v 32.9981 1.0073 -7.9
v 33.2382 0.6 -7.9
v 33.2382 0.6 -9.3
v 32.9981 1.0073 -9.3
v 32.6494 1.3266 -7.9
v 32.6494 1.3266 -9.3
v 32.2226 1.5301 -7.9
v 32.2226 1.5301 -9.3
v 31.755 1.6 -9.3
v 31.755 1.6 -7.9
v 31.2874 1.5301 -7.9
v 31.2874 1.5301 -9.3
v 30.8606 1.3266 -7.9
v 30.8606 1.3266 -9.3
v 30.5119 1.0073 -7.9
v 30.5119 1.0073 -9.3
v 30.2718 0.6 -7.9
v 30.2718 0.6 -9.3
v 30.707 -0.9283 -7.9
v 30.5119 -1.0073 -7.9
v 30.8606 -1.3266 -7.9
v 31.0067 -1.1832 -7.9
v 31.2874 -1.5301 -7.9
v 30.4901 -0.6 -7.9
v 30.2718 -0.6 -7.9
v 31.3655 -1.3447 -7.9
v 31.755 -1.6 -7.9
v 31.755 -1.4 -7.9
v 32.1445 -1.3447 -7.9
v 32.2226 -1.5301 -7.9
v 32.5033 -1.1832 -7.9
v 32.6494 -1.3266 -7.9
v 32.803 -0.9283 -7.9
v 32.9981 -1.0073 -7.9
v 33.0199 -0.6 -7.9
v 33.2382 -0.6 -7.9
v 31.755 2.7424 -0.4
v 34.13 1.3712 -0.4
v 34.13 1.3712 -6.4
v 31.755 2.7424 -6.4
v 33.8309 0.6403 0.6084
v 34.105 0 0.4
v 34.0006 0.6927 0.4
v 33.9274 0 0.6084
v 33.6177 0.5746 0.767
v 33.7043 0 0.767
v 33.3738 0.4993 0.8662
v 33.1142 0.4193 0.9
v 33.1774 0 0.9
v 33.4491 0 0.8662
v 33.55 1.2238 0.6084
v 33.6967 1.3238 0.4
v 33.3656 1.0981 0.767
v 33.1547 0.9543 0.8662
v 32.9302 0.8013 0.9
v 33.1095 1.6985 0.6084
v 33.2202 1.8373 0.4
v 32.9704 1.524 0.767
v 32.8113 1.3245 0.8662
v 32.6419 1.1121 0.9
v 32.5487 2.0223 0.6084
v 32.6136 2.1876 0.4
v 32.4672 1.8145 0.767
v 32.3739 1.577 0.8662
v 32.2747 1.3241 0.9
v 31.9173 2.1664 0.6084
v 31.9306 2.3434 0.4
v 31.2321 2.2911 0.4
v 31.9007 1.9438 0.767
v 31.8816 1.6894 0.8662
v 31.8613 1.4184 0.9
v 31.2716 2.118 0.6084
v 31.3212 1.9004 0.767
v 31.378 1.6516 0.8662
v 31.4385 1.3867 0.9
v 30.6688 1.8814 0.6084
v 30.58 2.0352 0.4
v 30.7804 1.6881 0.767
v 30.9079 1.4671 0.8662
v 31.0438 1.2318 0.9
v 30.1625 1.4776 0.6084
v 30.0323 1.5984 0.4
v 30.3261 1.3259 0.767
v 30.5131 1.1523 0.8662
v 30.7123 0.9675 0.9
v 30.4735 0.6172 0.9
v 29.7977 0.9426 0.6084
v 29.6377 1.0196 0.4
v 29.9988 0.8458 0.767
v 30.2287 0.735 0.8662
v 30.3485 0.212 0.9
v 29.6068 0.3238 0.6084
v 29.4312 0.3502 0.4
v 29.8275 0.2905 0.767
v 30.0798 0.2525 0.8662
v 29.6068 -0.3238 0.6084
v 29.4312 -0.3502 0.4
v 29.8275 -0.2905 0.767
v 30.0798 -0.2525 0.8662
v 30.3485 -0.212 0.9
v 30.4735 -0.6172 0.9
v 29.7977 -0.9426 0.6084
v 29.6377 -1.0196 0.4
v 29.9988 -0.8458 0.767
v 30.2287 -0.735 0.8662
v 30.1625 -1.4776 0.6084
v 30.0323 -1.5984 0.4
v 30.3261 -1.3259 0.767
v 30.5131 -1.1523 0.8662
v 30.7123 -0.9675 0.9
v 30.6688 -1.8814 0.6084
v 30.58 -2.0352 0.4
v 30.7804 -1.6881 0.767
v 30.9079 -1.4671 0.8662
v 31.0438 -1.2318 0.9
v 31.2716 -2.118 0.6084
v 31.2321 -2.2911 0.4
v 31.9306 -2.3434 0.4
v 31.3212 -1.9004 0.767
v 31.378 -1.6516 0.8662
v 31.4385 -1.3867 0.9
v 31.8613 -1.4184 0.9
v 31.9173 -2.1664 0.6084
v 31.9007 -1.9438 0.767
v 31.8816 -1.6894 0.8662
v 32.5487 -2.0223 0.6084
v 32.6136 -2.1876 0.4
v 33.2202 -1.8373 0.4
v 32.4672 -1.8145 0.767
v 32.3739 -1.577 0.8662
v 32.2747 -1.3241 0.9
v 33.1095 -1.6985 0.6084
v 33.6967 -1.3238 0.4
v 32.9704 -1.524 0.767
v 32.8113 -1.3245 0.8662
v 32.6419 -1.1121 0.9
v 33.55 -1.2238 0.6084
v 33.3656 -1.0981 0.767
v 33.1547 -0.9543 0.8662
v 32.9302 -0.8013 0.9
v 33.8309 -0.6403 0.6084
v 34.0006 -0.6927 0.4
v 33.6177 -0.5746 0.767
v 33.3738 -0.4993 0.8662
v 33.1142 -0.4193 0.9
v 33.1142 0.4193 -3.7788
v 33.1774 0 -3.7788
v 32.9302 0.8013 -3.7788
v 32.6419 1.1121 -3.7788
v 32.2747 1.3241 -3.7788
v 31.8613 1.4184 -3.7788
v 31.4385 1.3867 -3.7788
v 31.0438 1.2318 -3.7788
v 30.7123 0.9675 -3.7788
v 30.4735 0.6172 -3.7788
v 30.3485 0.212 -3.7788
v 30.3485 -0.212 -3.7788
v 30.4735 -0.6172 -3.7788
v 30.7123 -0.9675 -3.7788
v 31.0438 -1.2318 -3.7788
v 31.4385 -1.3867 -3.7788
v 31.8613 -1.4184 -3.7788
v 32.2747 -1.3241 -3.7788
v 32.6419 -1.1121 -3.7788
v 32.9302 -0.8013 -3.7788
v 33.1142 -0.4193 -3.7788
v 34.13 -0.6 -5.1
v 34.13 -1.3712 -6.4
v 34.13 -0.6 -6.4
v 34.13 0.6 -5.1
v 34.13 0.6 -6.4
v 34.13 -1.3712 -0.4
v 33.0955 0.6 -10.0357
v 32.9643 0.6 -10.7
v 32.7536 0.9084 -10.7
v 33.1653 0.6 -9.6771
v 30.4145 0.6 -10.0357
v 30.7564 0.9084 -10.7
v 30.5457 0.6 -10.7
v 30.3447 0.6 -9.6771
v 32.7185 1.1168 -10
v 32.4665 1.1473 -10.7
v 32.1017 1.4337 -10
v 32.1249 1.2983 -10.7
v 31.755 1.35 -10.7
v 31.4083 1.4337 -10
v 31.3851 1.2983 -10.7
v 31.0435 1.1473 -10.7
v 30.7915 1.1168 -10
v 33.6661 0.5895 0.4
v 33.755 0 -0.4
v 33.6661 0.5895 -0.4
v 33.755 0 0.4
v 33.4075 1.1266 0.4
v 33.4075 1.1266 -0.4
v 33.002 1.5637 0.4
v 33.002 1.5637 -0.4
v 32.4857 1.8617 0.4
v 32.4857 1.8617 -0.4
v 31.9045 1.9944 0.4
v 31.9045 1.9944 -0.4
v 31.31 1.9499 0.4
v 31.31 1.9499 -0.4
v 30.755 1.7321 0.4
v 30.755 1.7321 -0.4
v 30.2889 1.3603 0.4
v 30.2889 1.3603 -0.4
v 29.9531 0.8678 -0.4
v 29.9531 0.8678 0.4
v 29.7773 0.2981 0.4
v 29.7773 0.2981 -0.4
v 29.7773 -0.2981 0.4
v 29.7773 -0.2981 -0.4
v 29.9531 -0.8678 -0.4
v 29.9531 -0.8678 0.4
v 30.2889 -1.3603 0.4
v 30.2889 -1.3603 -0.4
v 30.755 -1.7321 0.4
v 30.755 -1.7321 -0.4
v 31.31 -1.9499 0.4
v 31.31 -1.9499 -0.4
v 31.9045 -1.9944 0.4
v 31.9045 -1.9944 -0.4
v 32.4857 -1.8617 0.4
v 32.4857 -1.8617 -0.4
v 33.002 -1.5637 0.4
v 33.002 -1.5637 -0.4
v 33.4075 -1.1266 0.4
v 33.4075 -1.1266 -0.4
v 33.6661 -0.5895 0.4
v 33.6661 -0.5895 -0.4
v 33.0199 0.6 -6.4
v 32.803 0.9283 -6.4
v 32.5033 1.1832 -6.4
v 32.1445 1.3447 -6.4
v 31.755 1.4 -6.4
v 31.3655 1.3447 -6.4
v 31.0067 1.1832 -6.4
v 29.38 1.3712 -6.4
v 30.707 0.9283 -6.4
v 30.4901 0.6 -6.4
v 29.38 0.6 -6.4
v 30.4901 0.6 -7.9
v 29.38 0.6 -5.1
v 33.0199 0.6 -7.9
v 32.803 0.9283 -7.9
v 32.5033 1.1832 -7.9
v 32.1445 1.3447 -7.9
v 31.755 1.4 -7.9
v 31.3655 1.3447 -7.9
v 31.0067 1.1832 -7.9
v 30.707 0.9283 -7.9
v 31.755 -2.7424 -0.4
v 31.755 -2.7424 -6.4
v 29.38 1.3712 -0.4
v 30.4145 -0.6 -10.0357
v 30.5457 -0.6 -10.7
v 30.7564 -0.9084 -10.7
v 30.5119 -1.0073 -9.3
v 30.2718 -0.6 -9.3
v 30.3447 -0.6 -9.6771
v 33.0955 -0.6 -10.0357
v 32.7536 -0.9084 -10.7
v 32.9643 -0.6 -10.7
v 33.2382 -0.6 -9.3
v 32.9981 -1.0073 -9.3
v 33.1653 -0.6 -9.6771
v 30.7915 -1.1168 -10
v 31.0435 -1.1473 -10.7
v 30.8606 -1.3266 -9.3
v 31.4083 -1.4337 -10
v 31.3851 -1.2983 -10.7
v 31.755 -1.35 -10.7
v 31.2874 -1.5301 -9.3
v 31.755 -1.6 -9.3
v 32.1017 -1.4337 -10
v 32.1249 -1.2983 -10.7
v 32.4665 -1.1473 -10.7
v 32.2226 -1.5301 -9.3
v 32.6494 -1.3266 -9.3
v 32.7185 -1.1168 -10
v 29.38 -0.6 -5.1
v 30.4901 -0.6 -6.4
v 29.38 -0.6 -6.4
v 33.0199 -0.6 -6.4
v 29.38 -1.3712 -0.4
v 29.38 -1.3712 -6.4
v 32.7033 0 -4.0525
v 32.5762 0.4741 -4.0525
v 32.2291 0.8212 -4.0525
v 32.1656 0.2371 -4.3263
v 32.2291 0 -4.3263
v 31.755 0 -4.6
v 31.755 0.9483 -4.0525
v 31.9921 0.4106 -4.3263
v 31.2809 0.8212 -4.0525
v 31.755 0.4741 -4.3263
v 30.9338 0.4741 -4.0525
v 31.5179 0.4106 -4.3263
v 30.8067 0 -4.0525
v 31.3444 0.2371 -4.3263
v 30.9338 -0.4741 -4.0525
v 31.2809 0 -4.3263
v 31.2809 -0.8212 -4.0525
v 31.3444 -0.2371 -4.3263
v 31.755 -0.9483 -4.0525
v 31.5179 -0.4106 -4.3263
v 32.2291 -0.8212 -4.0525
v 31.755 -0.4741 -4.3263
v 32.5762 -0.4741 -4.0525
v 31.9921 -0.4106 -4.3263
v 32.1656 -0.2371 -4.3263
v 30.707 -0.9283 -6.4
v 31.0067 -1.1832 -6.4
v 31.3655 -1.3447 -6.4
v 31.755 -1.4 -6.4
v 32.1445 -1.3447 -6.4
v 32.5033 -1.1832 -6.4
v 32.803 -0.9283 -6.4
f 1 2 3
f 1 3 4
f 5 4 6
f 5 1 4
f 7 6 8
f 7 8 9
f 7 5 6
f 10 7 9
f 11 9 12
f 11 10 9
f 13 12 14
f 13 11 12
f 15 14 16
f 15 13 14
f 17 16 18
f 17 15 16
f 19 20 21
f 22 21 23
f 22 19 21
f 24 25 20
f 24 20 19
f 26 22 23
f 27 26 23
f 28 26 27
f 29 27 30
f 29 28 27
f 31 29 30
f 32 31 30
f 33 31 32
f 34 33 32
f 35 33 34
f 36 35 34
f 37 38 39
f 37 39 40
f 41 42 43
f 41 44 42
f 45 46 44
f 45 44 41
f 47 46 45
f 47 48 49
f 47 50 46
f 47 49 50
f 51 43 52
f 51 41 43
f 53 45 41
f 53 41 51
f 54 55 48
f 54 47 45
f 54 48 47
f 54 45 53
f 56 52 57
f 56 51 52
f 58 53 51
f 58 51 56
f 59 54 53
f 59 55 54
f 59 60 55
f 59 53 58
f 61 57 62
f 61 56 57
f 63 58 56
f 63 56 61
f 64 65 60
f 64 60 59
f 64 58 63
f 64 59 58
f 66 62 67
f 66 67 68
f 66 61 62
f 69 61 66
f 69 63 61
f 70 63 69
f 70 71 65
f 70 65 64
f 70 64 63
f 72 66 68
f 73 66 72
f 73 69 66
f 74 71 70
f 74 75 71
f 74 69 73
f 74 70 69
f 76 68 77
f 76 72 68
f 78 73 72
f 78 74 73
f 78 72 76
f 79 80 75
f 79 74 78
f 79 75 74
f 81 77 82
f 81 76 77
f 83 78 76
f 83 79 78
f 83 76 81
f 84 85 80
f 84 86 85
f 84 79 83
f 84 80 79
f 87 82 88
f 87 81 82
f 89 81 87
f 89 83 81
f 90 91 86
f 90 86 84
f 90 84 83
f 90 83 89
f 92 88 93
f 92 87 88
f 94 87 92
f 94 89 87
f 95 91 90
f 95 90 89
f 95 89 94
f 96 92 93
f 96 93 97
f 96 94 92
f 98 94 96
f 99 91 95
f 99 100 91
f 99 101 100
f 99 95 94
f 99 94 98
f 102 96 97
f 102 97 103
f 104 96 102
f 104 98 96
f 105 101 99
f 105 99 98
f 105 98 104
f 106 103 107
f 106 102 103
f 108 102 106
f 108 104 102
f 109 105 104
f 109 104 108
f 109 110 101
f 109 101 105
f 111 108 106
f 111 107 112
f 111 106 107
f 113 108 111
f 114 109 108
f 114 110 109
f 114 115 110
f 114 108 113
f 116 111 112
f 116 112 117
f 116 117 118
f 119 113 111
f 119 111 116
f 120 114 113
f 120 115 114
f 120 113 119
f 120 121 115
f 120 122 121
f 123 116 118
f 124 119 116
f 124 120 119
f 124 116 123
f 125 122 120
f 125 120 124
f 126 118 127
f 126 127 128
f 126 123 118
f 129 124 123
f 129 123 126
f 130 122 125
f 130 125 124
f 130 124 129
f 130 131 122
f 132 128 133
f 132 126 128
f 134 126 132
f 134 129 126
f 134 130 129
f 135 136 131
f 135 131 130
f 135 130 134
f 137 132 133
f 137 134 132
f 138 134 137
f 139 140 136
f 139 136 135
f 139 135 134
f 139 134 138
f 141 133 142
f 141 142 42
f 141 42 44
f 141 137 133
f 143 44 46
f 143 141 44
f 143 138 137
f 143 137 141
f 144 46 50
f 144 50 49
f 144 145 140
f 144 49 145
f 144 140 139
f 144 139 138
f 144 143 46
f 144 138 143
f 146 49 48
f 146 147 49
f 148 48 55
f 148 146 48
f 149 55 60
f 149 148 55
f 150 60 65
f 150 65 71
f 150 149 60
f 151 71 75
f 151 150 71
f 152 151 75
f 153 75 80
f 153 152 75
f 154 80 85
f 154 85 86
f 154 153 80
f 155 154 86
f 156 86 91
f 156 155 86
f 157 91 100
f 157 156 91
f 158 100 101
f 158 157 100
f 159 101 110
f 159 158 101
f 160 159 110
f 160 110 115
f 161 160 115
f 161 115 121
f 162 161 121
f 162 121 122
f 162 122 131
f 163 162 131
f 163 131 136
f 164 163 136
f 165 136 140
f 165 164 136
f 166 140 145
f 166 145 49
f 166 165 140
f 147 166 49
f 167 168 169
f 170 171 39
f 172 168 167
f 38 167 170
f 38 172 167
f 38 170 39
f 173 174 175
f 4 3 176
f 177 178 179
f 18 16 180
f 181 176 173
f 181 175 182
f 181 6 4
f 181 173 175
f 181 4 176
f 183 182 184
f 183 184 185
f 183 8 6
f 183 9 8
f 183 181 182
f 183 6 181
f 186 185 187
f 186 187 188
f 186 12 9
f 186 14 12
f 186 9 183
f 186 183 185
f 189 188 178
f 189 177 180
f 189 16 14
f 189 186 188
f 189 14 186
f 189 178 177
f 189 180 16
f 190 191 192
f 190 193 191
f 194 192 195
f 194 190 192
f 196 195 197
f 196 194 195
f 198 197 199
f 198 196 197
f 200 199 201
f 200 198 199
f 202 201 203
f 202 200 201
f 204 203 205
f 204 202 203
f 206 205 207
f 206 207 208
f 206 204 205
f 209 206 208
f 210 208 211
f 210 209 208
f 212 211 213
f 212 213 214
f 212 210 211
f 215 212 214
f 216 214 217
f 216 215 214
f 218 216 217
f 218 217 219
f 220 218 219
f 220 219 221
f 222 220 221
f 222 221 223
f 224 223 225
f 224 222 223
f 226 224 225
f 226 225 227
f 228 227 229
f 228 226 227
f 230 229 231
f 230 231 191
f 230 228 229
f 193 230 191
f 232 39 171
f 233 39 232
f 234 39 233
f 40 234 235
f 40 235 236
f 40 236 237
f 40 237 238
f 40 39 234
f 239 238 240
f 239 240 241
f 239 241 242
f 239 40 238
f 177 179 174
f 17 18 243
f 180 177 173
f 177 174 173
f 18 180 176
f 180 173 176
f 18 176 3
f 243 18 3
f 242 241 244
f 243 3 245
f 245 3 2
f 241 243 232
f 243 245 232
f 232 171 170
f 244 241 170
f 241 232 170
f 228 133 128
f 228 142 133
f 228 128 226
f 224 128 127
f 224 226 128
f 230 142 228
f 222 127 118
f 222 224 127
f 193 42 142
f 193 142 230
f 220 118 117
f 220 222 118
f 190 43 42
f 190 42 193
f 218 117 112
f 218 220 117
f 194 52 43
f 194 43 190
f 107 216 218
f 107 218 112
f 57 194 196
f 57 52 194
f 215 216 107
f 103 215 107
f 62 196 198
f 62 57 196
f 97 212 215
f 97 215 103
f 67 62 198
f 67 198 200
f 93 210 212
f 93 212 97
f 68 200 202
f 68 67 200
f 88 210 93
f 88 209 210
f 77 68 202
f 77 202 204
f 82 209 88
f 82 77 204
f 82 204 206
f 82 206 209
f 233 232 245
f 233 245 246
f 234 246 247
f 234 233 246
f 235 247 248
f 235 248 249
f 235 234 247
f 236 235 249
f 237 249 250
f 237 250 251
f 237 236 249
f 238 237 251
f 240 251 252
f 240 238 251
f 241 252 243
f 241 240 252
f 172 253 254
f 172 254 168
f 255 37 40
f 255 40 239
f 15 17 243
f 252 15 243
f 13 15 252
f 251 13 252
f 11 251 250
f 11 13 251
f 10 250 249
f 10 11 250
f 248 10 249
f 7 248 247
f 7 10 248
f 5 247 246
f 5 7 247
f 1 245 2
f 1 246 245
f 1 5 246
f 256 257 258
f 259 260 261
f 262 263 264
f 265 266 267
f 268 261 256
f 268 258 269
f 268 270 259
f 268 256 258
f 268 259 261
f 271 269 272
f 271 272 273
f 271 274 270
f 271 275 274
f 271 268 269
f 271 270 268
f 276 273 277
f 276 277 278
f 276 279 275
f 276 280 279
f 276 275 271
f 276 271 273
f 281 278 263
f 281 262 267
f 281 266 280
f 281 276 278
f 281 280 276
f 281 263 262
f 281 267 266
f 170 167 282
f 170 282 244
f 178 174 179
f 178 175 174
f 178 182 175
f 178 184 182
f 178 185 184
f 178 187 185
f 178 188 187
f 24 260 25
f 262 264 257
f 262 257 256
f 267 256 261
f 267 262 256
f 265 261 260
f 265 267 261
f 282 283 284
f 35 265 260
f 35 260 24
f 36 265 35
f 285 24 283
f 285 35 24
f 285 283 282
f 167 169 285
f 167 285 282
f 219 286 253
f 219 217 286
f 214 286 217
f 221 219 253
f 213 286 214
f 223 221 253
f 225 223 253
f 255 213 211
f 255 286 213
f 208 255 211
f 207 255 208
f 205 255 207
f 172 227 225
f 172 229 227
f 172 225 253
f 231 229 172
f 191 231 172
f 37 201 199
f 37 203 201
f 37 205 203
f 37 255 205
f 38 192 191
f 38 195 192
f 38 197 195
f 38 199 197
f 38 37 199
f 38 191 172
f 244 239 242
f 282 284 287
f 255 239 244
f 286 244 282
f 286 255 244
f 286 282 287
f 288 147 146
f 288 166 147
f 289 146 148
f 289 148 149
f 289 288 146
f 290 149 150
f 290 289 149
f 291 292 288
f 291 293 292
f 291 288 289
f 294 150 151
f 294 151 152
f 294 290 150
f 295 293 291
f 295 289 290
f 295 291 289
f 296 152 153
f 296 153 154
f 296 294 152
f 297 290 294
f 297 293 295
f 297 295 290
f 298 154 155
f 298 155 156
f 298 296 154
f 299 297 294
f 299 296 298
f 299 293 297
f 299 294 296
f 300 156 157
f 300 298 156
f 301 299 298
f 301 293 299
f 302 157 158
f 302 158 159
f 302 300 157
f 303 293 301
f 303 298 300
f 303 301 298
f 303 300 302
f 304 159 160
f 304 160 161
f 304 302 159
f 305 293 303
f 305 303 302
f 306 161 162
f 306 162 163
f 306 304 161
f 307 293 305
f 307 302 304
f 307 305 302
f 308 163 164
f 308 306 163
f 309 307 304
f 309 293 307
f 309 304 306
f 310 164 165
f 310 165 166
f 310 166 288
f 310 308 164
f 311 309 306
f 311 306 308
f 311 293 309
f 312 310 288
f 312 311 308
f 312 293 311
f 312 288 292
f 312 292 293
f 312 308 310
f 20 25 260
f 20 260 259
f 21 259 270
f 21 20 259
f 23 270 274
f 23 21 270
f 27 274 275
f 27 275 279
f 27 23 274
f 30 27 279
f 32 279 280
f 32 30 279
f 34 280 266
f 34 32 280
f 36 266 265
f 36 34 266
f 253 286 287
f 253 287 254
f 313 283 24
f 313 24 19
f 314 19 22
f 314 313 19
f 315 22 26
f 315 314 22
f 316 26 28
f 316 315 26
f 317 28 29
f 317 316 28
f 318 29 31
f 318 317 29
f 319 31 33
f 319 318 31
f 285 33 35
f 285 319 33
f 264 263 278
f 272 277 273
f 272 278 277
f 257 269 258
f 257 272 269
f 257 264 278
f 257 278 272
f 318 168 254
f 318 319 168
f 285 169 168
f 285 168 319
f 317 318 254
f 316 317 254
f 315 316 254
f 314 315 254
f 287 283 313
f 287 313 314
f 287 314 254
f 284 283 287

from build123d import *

# Parameters (mm, degrees)
SKETCH010_R          = 4.679612
POCKET005_DEPTH      = 10.301
SKETCH011_W          = 1.2
SKETCH011_H          = 6
POCKET006_DEPTH      = 2.376
POCKET006_DEPTH_BACK = 2.376


with BuildPart() as part:
    # Sketch009 → Revolution (revolve)
    with BuildSketch(Plane.XZ):
        with BuildLine():
            Line((1.4224, 0.5), (1.4224, -4.178777))
            Line((1.4224, -4.178777), (0, -5))
            Line((0, -5), (0, -11.1))
            Line((0, -11.1), (1.35, -11.1))
            Line((1.35, -11.1), (1.6, -9.7))
            Line((1.6, -9.7), (1.6, -8.3))
            Line((1.6, -8.3), (1.4, -8.3))
            Line((1.4, -8.3), (1.4, -6.8))
            Line((1.4, -6.8), (4, -6.8))
            Line((4, -6.8), (4, -0.8))
            Line((4, -0.8), (2, -0.8))
            Line((2, -0.8), (2, 0))
            Line((2, 0), (2.35, 0))
            ThreePointArc((2.35, 0), (1.949288, 0.36704), (1.4224, 0.5))
        make_face()
    revolve(axis=Axis((0, 0, 0), (0, 0, 1)))

    # Sketch010 (on Face10 of Revolution) → Pocket005 (cut, through all)
    with BuildSketch(Plane(origin=(0, 0, -0.8), x_dir=(-1, 0, 0), z_dir=(0, 0, 1))):
        Circle(SKETCH010_R)
        Polygon((0, 2.742414), (-2.375, 1.371207), (-2.375, -1.371207), (0, -2.742414), (2.375, -1.371207), (2.375, 1.371207), align=None, mode=Mode.SUBTRACT)
    extrude(amount=-POCKET005_DEPTH, mode=Mode.SUBTRACT)

    # Sketch011 → Pocket006 (cut, two sides)
    with BuildSketch(Plane.YZ) as pocket006_sk:
        with Locations((0, -8.5)):
            Rectangle(SKETCH011_W, SKETCH011_H)
    extrude(amount=-POCKET006_DEPTH, mode=Mode.SUBTRACT)
    extrude(pocket006_sk.sketch, amount=POCKET006_DEPTH_BACK, mode=Mode.SUBTRACT)


with BuildPart() as part_1:
    # Body002 placement: moved
    add(part.part.moved(Location((-31.755, 0, 0.4))))


with BuildPart() as part_2:
    # Clone placement: moved
    add(part_1.part.moved(Location((31.755, 0, -0.4))))


with BuildPart() as part_3:
    # Body003 placement: moved
    add(part_2.part.moved(Location((31.755, 0, 0.4))))


solid = part_3.part
